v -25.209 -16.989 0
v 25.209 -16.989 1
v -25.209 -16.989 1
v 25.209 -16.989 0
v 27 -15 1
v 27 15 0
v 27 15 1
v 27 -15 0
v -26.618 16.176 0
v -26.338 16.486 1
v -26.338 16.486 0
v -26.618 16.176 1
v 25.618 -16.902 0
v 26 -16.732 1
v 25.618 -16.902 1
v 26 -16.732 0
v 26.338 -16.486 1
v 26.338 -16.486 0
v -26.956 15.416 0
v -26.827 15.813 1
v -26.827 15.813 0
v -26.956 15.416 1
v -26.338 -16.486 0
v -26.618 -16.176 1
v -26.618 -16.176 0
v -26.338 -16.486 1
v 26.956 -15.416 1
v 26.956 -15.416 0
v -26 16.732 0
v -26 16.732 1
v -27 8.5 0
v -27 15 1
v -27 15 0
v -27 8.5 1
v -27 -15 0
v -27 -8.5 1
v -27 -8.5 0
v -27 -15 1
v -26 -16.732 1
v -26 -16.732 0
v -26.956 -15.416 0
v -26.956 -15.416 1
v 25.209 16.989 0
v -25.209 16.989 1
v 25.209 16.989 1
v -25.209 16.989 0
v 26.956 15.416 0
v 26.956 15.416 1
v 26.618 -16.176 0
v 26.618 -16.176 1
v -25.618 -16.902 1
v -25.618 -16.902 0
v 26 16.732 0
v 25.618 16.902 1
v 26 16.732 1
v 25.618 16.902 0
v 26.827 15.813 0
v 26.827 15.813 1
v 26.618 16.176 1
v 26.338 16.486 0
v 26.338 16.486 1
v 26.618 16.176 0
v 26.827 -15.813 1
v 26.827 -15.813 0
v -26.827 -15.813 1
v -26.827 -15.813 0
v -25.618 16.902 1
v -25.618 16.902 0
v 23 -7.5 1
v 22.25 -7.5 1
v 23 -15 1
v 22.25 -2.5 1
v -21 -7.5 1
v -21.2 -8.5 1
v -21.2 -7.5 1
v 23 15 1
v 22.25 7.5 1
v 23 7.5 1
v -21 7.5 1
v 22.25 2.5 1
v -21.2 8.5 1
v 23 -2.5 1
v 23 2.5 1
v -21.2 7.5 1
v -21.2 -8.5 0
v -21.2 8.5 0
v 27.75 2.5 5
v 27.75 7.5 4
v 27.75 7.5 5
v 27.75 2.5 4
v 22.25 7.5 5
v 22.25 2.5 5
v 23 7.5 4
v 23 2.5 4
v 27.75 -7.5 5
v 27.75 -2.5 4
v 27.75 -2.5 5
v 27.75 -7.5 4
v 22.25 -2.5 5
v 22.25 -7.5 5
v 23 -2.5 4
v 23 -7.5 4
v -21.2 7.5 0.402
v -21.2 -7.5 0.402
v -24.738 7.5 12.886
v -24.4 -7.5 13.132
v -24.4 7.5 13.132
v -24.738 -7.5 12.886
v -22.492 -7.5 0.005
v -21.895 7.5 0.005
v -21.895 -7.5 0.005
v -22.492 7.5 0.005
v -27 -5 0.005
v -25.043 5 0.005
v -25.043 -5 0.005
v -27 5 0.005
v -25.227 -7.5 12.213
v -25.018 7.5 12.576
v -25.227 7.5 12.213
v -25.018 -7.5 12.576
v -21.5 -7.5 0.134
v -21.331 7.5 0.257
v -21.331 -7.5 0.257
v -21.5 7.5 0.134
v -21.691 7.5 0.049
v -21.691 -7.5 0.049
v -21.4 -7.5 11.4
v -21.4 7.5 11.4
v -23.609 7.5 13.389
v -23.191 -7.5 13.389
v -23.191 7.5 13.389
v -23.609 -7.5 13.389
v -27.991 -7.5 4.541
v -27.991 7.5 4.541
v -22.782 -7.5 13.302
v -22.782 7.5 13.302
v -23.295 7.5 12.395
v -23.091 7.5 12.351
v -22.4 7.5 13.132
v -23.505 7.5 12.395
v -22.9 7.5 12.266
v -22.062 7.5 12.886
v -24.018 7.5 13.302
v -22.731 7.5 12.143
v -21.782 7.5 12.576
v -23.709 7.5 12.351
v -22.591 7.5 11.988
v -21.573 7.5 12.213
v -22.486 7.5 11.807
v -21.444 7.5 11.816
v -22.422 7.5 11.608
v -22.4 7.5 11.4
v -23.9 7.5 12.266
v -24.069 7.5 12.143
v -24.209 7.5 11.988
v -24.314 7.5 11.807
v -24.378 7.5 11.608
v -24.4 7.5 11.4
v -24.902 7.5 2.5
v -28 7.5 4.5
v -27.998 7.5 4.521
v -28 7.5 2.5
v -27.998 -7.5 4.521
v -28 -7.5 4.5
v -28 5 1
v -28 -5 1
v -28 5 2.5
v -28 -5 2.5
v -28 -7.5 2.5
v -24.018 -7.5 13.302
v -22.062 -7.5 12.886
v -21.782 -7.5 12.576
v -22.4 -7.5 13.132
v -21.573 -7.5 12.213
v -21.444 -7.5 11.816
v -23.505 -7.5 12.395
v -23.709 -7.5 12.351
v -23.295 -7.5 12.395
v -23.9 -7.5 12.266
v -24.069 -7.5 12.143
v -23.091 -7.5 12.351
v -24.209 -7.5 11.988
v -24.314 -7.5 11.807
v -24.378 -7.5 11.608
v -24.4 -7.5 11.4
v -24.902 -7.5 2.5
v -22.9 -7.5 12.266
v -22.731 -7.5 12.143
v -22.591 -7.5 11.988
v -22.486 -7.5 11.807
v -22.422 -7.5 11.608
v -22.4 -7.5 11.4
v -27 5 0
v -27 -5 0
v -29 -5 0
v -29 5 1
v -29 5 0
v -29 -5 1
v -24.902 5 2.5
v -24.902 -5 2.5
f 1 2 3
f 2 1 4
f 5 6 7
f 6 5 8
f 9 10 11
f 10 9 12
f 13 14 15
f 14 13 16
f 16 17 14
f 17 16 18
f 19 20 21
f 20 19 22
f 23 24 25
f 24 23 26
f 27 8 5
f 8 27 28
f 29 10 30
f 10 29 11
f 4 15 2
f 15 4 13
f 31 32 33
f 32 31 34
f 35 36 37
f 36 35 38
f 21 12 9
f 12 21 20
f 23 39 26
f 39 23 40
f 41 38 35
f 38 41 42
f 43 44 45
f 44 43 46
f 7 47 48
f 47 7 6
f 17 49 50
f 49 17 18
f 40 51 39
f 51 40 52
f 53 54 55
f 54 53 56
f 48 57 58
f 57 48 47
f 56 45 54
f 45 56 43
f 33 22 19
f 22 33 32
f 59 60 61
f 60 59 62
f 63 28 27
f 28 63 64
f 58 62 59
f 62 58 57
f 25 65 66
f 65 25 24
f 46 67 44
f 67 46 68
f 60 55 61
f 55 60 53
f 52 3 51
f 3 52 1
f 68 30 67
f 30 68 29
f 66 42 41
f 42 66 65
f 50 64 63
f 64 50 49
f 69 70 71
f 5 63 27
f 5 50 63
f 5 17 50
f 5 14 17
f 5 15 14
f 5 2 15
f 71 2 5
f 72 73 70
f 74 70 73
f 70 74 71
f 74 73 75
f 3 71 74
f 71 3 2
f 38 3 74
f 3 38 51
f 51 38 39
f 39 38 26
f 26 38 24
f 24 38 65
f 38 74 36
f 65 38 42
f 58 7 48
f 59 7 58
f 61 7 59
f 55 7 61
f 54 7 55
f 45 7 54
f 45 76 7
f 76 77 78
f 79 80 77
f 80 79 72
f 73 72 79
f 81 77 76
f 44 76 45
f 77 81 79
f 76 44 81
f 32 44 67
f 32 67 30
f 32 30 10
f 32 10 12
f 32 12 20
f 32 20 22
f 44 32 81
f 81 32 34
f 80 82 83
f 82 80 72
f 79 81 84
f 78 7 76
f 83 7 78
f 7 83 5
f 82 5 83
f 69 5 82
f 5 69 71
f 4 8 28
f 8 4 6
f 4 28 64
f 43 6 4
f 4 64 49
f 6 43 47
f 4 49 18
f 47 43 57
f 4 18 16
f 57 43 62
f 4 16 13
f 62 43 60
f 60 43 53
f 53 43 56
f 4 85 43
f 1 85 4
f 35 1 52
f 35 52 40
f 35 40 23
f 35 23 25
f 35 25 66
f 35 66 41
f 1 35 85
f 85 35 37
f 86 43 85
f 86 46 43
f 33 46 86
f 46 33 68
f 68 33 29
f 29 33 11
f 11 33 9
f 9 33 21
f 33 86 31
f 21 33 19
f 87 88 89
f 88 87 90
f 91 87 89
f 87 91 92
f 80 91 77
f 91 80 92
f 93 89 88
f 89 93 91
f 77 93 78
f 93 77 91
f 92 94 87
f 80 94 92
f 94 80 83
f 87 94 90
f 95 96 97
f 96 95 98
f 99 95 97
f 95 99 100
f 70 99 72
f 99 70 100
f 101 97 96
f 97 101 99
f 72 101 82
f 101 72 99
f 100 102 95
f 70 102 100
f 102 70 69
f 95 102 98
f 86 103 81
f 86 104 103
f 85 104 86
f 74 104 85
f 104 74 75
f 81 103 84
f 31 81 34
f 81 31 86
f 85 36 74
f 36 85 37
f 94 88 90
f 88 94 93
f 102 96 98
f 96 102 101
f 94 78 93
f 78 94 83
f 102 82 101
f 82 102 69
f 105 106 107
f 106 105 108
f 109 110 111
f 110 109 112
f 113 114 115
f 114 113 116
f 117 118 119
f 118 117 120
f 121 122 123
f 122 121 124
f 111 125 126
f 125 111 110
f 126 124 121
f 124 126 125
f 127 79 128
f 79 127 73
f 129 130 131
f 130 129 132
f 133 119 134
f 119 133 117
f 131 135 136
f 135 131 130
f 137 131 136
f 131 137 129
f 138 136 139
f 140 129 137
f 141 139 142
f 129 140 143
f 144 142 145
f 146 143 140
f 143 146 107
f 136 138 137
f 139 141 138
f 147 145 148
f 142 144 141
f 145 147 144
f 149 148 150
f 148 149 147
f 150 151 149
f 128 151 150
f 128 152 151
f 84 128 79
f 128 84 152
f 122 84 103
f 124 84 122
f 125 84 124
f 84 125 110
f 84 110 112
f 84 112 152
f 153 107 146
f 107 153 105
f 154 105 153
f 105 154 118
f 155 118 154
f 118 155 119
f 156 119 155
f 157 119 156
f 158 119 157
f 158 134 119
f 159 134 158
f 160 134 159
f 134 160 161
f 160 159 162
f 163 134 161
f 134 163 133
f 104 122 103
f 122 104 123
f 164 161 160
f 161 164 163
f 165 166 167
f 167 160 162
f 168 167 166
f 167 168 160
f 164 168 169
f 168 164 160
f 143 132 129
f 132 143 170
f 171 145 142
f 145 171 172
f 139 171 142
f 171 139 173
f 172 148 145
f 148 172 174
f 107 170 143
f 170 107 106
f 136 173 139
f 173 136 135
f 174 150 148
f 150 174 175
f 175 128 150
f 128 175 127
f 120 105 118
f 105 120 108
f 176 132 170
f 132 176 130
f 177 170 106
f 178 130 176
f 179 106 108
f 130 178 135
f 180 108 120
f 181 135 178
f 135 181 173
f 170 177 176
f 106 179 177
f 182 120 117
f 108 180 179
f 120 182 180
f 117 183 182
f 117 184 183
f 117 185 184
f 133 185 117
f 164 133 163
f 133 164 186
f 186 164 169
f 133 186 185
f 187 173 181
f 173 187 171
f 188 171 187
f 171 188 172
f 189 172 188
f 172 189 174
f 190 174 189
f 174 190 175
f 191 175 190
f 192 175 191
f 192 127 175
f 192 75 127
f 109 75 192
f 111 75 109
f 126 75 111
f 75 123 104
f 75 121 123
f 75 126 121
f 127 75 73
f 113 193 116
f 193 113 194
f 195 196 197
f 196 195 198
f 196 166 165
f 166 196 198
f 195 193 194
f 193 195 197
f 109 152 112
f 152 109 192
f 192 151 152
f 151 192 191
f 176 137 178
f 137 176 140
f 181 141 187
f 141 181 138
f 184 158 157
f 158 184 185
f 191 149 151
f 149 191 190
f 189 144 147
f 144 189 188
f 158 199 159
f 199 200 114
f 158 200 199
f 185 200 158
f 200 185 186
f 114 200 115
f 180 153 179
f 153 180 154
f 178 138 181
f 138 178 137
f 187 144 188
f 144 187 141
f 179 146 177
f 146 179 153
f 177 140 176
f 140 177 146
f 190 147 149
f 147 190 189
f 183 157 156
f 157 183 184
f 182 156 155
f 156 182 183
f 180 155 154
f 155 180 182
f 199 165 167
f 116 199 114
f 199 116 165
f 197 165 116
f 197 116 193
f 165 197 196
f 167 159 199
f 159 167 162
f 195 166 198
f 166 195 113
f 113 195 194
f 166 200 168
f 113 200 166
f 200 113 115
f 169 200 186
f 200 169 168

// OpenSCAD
// This generates custom battery covers
// Licenced under Creative Commons: Attribution, Share-Alike
//		http://creativecommons.org/licenses/by-sa/3.0/
// For attribution you can direct people to the original file on thingiverse:
// 		http://www.thingiverse.com/thing:243269

// ================ variables

//CUSTOMIZER VARIABLES

/* [Basic] */

// how long the battery cover is.  (This dimension is in the clip-to-ears direction.)
length=50; // 10:200

// how wide the battery cover is
width=30; // 10:200

// how thick the battery cover is
thickness=0.5;  // 0.1:10

// radius for rounding over the corners of the battery cover
corner_radius=2;  // 0:10

// how thick the case plastic is
case_thickness=3.5;

/* [Ears] */

// how wide the ear tabs are
ear_width=5;  // 2:25

// how wide the ear tabs are
ear_length=5;  // 2:25

// how far apart the ear tabs are.  (To create one wide tab, just set this to 0.)
ear_spacing=10;  // 1:100

// How thick the case is where the ears attach.  Usually it should be the same as "thickness" on the "basic" tab
ear_case_thickness=3.5;  // 0.1:10

/* [Clip] */

// How wide the clip is
clip_width=15; // 5:50

// How deep the clip is
clip_length=5.8; // 5.8

// This is used for a side-engagement clip.  Most clips are this way now.  It measures how wide the small part of the clip is.
clip_width_sides=10;

// This is for a front-engagement clip.  If unused, set it to 0, otherwise, how long the catch will be (usually about 2-3mm)
clip_length_catch=1;

// How far the clip is in/out relative to the edge of the battery cover.
//clip_indent=0;  // -15:15

// This is how far down into the battery case the clip engages.  Usually it should be the same as "thickness" on the "basic" tab
clip_case_thickness=3.5;  // 0.1:10

// The thickness of the finger tab
tab_thickness=1;

/* [Gussets] */

// Which direction the support gussets go
gusset_orientation=0; // [0:clip_lengthwise,1:clip_widthwise]

// How thick the gussets are (set to 0 to turn off gussets)
gusset_thickness=0;

// How high the gussets are
gusset_height=0;

// How far apart the gussets are
gusset_spacing=0;

/* [Advanced] */

// Resolution
$fn=30;

// end variables

cover(width,length,thickness,case_thickness,gusset_thickness,corner_radius,ear_width,ear_spacing,clip_width,clip_width_sides,clip_length,clip_length_catch,clip_case_thickness,ear_length,tab_thickness);

module clip(clip_width=15,clip_width_sides=10,clip_length=1,clip_case_thickness=5,clip_length_catch=3,tab_thickness=3) {
	rotate([90,0,0]){
		difference () {
			union(){ // the outside shape
				hull () {
					translate([0,0,0]) cylinder(r=1,h=clip_width); // outside radius
					translate([5,0,0]) cylinder(r=1,h=clip_width); // inside fadius
					translate([3.6,10.4,0]) cylinder(r=2,h=clip_width); // top
					if(clip_length_catch>0){
						translate([-clip_length_catch+0.1,clip_case_thickness,0]) cylinder(r=0.1,h=clip_width); // add a front overhang
					}
				}
				translate([-2,-1,0]) cube([2,tab_thickness,clip_width]); // the overlap tab
			}
			union(){ // The inside void
				hull() { 
					translate([3.6,10.4,0]) cylinder(r=1,h=clip_width);
					translate([3.5,-2,0]) cylinder(r=1,h=clip_width);
					translate([2.9,-2,0]) cylinder(r=1,h=clip_width);
				}
				//translate([-tab_thickness,0,0]) cube([3,clip_case_thickness,clip_width]); // trim off outside
				translate([-2,-2,0]) cube([5,clip_case_thickness,(clip_width-clip_width_sides)/2]); // trim off left side
				translate([-2,-2,clip_width-(clip_width-clip_width_sides)/2]) cube([5,clip_case_thickness,(clip_width-clip_width_sides)/2]); // trim off right side
			}
		}
	}
}

module cover(width=30,length=60,thickness=0.5,case_thickness=3.9,gusset_thickness=4.5,corner_radius=1,ear_width=7.5,ear_spacing=29,clip_width=15,clip_width_sides=10,clip_length=1,clip_length_catch=3,clip_case_thickness=5,ear_length=5.8,tab_thickness=3) {
	difference(){
		// the base shape
		union(){
			// the face
			translate([-length/2,-width/2,0]) 
			minkowski(){
				cube([length,width,thickness]);
				if(corner_radius>0) cylinder(r=corner_radius,h=thickness);
			}
			// gussets
			translate([8.1,0,0]) cube([54.8,1.6,gusset_thickness]);
			translate([8.1,64.4,0]) cube([54.8,1.6,gusset_thickness]);
			// the ears
			translate([(length-ear_length-thickness)/2,(ear_spacing/2)-(ear_width/2),thickness*2]) cube([ear_length+thickness,ear_width,case_thickness+thickness]);
			translate([(length-ear_length-thickness)/2,(-ear_spacing/2)+(-ear_width/2),thickness*2]) cube([ear_length+thickness,ear_width,case_thickness+thickness]);
		}
		union(){
			translate([(-length/2)-corner_radius,-clip_width/2-1,0]) cube([clip_length,clip_width+2,thickness*2]); // the hole for the clip
			translate([(length-ear_length)/2+thickness,-width/2,thickness*2]) cube([30,width,case_thickness-thickness]); // ear notch 
		}
	}
	// the clip itsself
	translate([(-length/2)-corner_radius,clip_width/2,1]) clip(clip_width,clip_width_sides,clip_length,clip_case_thickness,clip_length_catch,tab_thickness);
}
